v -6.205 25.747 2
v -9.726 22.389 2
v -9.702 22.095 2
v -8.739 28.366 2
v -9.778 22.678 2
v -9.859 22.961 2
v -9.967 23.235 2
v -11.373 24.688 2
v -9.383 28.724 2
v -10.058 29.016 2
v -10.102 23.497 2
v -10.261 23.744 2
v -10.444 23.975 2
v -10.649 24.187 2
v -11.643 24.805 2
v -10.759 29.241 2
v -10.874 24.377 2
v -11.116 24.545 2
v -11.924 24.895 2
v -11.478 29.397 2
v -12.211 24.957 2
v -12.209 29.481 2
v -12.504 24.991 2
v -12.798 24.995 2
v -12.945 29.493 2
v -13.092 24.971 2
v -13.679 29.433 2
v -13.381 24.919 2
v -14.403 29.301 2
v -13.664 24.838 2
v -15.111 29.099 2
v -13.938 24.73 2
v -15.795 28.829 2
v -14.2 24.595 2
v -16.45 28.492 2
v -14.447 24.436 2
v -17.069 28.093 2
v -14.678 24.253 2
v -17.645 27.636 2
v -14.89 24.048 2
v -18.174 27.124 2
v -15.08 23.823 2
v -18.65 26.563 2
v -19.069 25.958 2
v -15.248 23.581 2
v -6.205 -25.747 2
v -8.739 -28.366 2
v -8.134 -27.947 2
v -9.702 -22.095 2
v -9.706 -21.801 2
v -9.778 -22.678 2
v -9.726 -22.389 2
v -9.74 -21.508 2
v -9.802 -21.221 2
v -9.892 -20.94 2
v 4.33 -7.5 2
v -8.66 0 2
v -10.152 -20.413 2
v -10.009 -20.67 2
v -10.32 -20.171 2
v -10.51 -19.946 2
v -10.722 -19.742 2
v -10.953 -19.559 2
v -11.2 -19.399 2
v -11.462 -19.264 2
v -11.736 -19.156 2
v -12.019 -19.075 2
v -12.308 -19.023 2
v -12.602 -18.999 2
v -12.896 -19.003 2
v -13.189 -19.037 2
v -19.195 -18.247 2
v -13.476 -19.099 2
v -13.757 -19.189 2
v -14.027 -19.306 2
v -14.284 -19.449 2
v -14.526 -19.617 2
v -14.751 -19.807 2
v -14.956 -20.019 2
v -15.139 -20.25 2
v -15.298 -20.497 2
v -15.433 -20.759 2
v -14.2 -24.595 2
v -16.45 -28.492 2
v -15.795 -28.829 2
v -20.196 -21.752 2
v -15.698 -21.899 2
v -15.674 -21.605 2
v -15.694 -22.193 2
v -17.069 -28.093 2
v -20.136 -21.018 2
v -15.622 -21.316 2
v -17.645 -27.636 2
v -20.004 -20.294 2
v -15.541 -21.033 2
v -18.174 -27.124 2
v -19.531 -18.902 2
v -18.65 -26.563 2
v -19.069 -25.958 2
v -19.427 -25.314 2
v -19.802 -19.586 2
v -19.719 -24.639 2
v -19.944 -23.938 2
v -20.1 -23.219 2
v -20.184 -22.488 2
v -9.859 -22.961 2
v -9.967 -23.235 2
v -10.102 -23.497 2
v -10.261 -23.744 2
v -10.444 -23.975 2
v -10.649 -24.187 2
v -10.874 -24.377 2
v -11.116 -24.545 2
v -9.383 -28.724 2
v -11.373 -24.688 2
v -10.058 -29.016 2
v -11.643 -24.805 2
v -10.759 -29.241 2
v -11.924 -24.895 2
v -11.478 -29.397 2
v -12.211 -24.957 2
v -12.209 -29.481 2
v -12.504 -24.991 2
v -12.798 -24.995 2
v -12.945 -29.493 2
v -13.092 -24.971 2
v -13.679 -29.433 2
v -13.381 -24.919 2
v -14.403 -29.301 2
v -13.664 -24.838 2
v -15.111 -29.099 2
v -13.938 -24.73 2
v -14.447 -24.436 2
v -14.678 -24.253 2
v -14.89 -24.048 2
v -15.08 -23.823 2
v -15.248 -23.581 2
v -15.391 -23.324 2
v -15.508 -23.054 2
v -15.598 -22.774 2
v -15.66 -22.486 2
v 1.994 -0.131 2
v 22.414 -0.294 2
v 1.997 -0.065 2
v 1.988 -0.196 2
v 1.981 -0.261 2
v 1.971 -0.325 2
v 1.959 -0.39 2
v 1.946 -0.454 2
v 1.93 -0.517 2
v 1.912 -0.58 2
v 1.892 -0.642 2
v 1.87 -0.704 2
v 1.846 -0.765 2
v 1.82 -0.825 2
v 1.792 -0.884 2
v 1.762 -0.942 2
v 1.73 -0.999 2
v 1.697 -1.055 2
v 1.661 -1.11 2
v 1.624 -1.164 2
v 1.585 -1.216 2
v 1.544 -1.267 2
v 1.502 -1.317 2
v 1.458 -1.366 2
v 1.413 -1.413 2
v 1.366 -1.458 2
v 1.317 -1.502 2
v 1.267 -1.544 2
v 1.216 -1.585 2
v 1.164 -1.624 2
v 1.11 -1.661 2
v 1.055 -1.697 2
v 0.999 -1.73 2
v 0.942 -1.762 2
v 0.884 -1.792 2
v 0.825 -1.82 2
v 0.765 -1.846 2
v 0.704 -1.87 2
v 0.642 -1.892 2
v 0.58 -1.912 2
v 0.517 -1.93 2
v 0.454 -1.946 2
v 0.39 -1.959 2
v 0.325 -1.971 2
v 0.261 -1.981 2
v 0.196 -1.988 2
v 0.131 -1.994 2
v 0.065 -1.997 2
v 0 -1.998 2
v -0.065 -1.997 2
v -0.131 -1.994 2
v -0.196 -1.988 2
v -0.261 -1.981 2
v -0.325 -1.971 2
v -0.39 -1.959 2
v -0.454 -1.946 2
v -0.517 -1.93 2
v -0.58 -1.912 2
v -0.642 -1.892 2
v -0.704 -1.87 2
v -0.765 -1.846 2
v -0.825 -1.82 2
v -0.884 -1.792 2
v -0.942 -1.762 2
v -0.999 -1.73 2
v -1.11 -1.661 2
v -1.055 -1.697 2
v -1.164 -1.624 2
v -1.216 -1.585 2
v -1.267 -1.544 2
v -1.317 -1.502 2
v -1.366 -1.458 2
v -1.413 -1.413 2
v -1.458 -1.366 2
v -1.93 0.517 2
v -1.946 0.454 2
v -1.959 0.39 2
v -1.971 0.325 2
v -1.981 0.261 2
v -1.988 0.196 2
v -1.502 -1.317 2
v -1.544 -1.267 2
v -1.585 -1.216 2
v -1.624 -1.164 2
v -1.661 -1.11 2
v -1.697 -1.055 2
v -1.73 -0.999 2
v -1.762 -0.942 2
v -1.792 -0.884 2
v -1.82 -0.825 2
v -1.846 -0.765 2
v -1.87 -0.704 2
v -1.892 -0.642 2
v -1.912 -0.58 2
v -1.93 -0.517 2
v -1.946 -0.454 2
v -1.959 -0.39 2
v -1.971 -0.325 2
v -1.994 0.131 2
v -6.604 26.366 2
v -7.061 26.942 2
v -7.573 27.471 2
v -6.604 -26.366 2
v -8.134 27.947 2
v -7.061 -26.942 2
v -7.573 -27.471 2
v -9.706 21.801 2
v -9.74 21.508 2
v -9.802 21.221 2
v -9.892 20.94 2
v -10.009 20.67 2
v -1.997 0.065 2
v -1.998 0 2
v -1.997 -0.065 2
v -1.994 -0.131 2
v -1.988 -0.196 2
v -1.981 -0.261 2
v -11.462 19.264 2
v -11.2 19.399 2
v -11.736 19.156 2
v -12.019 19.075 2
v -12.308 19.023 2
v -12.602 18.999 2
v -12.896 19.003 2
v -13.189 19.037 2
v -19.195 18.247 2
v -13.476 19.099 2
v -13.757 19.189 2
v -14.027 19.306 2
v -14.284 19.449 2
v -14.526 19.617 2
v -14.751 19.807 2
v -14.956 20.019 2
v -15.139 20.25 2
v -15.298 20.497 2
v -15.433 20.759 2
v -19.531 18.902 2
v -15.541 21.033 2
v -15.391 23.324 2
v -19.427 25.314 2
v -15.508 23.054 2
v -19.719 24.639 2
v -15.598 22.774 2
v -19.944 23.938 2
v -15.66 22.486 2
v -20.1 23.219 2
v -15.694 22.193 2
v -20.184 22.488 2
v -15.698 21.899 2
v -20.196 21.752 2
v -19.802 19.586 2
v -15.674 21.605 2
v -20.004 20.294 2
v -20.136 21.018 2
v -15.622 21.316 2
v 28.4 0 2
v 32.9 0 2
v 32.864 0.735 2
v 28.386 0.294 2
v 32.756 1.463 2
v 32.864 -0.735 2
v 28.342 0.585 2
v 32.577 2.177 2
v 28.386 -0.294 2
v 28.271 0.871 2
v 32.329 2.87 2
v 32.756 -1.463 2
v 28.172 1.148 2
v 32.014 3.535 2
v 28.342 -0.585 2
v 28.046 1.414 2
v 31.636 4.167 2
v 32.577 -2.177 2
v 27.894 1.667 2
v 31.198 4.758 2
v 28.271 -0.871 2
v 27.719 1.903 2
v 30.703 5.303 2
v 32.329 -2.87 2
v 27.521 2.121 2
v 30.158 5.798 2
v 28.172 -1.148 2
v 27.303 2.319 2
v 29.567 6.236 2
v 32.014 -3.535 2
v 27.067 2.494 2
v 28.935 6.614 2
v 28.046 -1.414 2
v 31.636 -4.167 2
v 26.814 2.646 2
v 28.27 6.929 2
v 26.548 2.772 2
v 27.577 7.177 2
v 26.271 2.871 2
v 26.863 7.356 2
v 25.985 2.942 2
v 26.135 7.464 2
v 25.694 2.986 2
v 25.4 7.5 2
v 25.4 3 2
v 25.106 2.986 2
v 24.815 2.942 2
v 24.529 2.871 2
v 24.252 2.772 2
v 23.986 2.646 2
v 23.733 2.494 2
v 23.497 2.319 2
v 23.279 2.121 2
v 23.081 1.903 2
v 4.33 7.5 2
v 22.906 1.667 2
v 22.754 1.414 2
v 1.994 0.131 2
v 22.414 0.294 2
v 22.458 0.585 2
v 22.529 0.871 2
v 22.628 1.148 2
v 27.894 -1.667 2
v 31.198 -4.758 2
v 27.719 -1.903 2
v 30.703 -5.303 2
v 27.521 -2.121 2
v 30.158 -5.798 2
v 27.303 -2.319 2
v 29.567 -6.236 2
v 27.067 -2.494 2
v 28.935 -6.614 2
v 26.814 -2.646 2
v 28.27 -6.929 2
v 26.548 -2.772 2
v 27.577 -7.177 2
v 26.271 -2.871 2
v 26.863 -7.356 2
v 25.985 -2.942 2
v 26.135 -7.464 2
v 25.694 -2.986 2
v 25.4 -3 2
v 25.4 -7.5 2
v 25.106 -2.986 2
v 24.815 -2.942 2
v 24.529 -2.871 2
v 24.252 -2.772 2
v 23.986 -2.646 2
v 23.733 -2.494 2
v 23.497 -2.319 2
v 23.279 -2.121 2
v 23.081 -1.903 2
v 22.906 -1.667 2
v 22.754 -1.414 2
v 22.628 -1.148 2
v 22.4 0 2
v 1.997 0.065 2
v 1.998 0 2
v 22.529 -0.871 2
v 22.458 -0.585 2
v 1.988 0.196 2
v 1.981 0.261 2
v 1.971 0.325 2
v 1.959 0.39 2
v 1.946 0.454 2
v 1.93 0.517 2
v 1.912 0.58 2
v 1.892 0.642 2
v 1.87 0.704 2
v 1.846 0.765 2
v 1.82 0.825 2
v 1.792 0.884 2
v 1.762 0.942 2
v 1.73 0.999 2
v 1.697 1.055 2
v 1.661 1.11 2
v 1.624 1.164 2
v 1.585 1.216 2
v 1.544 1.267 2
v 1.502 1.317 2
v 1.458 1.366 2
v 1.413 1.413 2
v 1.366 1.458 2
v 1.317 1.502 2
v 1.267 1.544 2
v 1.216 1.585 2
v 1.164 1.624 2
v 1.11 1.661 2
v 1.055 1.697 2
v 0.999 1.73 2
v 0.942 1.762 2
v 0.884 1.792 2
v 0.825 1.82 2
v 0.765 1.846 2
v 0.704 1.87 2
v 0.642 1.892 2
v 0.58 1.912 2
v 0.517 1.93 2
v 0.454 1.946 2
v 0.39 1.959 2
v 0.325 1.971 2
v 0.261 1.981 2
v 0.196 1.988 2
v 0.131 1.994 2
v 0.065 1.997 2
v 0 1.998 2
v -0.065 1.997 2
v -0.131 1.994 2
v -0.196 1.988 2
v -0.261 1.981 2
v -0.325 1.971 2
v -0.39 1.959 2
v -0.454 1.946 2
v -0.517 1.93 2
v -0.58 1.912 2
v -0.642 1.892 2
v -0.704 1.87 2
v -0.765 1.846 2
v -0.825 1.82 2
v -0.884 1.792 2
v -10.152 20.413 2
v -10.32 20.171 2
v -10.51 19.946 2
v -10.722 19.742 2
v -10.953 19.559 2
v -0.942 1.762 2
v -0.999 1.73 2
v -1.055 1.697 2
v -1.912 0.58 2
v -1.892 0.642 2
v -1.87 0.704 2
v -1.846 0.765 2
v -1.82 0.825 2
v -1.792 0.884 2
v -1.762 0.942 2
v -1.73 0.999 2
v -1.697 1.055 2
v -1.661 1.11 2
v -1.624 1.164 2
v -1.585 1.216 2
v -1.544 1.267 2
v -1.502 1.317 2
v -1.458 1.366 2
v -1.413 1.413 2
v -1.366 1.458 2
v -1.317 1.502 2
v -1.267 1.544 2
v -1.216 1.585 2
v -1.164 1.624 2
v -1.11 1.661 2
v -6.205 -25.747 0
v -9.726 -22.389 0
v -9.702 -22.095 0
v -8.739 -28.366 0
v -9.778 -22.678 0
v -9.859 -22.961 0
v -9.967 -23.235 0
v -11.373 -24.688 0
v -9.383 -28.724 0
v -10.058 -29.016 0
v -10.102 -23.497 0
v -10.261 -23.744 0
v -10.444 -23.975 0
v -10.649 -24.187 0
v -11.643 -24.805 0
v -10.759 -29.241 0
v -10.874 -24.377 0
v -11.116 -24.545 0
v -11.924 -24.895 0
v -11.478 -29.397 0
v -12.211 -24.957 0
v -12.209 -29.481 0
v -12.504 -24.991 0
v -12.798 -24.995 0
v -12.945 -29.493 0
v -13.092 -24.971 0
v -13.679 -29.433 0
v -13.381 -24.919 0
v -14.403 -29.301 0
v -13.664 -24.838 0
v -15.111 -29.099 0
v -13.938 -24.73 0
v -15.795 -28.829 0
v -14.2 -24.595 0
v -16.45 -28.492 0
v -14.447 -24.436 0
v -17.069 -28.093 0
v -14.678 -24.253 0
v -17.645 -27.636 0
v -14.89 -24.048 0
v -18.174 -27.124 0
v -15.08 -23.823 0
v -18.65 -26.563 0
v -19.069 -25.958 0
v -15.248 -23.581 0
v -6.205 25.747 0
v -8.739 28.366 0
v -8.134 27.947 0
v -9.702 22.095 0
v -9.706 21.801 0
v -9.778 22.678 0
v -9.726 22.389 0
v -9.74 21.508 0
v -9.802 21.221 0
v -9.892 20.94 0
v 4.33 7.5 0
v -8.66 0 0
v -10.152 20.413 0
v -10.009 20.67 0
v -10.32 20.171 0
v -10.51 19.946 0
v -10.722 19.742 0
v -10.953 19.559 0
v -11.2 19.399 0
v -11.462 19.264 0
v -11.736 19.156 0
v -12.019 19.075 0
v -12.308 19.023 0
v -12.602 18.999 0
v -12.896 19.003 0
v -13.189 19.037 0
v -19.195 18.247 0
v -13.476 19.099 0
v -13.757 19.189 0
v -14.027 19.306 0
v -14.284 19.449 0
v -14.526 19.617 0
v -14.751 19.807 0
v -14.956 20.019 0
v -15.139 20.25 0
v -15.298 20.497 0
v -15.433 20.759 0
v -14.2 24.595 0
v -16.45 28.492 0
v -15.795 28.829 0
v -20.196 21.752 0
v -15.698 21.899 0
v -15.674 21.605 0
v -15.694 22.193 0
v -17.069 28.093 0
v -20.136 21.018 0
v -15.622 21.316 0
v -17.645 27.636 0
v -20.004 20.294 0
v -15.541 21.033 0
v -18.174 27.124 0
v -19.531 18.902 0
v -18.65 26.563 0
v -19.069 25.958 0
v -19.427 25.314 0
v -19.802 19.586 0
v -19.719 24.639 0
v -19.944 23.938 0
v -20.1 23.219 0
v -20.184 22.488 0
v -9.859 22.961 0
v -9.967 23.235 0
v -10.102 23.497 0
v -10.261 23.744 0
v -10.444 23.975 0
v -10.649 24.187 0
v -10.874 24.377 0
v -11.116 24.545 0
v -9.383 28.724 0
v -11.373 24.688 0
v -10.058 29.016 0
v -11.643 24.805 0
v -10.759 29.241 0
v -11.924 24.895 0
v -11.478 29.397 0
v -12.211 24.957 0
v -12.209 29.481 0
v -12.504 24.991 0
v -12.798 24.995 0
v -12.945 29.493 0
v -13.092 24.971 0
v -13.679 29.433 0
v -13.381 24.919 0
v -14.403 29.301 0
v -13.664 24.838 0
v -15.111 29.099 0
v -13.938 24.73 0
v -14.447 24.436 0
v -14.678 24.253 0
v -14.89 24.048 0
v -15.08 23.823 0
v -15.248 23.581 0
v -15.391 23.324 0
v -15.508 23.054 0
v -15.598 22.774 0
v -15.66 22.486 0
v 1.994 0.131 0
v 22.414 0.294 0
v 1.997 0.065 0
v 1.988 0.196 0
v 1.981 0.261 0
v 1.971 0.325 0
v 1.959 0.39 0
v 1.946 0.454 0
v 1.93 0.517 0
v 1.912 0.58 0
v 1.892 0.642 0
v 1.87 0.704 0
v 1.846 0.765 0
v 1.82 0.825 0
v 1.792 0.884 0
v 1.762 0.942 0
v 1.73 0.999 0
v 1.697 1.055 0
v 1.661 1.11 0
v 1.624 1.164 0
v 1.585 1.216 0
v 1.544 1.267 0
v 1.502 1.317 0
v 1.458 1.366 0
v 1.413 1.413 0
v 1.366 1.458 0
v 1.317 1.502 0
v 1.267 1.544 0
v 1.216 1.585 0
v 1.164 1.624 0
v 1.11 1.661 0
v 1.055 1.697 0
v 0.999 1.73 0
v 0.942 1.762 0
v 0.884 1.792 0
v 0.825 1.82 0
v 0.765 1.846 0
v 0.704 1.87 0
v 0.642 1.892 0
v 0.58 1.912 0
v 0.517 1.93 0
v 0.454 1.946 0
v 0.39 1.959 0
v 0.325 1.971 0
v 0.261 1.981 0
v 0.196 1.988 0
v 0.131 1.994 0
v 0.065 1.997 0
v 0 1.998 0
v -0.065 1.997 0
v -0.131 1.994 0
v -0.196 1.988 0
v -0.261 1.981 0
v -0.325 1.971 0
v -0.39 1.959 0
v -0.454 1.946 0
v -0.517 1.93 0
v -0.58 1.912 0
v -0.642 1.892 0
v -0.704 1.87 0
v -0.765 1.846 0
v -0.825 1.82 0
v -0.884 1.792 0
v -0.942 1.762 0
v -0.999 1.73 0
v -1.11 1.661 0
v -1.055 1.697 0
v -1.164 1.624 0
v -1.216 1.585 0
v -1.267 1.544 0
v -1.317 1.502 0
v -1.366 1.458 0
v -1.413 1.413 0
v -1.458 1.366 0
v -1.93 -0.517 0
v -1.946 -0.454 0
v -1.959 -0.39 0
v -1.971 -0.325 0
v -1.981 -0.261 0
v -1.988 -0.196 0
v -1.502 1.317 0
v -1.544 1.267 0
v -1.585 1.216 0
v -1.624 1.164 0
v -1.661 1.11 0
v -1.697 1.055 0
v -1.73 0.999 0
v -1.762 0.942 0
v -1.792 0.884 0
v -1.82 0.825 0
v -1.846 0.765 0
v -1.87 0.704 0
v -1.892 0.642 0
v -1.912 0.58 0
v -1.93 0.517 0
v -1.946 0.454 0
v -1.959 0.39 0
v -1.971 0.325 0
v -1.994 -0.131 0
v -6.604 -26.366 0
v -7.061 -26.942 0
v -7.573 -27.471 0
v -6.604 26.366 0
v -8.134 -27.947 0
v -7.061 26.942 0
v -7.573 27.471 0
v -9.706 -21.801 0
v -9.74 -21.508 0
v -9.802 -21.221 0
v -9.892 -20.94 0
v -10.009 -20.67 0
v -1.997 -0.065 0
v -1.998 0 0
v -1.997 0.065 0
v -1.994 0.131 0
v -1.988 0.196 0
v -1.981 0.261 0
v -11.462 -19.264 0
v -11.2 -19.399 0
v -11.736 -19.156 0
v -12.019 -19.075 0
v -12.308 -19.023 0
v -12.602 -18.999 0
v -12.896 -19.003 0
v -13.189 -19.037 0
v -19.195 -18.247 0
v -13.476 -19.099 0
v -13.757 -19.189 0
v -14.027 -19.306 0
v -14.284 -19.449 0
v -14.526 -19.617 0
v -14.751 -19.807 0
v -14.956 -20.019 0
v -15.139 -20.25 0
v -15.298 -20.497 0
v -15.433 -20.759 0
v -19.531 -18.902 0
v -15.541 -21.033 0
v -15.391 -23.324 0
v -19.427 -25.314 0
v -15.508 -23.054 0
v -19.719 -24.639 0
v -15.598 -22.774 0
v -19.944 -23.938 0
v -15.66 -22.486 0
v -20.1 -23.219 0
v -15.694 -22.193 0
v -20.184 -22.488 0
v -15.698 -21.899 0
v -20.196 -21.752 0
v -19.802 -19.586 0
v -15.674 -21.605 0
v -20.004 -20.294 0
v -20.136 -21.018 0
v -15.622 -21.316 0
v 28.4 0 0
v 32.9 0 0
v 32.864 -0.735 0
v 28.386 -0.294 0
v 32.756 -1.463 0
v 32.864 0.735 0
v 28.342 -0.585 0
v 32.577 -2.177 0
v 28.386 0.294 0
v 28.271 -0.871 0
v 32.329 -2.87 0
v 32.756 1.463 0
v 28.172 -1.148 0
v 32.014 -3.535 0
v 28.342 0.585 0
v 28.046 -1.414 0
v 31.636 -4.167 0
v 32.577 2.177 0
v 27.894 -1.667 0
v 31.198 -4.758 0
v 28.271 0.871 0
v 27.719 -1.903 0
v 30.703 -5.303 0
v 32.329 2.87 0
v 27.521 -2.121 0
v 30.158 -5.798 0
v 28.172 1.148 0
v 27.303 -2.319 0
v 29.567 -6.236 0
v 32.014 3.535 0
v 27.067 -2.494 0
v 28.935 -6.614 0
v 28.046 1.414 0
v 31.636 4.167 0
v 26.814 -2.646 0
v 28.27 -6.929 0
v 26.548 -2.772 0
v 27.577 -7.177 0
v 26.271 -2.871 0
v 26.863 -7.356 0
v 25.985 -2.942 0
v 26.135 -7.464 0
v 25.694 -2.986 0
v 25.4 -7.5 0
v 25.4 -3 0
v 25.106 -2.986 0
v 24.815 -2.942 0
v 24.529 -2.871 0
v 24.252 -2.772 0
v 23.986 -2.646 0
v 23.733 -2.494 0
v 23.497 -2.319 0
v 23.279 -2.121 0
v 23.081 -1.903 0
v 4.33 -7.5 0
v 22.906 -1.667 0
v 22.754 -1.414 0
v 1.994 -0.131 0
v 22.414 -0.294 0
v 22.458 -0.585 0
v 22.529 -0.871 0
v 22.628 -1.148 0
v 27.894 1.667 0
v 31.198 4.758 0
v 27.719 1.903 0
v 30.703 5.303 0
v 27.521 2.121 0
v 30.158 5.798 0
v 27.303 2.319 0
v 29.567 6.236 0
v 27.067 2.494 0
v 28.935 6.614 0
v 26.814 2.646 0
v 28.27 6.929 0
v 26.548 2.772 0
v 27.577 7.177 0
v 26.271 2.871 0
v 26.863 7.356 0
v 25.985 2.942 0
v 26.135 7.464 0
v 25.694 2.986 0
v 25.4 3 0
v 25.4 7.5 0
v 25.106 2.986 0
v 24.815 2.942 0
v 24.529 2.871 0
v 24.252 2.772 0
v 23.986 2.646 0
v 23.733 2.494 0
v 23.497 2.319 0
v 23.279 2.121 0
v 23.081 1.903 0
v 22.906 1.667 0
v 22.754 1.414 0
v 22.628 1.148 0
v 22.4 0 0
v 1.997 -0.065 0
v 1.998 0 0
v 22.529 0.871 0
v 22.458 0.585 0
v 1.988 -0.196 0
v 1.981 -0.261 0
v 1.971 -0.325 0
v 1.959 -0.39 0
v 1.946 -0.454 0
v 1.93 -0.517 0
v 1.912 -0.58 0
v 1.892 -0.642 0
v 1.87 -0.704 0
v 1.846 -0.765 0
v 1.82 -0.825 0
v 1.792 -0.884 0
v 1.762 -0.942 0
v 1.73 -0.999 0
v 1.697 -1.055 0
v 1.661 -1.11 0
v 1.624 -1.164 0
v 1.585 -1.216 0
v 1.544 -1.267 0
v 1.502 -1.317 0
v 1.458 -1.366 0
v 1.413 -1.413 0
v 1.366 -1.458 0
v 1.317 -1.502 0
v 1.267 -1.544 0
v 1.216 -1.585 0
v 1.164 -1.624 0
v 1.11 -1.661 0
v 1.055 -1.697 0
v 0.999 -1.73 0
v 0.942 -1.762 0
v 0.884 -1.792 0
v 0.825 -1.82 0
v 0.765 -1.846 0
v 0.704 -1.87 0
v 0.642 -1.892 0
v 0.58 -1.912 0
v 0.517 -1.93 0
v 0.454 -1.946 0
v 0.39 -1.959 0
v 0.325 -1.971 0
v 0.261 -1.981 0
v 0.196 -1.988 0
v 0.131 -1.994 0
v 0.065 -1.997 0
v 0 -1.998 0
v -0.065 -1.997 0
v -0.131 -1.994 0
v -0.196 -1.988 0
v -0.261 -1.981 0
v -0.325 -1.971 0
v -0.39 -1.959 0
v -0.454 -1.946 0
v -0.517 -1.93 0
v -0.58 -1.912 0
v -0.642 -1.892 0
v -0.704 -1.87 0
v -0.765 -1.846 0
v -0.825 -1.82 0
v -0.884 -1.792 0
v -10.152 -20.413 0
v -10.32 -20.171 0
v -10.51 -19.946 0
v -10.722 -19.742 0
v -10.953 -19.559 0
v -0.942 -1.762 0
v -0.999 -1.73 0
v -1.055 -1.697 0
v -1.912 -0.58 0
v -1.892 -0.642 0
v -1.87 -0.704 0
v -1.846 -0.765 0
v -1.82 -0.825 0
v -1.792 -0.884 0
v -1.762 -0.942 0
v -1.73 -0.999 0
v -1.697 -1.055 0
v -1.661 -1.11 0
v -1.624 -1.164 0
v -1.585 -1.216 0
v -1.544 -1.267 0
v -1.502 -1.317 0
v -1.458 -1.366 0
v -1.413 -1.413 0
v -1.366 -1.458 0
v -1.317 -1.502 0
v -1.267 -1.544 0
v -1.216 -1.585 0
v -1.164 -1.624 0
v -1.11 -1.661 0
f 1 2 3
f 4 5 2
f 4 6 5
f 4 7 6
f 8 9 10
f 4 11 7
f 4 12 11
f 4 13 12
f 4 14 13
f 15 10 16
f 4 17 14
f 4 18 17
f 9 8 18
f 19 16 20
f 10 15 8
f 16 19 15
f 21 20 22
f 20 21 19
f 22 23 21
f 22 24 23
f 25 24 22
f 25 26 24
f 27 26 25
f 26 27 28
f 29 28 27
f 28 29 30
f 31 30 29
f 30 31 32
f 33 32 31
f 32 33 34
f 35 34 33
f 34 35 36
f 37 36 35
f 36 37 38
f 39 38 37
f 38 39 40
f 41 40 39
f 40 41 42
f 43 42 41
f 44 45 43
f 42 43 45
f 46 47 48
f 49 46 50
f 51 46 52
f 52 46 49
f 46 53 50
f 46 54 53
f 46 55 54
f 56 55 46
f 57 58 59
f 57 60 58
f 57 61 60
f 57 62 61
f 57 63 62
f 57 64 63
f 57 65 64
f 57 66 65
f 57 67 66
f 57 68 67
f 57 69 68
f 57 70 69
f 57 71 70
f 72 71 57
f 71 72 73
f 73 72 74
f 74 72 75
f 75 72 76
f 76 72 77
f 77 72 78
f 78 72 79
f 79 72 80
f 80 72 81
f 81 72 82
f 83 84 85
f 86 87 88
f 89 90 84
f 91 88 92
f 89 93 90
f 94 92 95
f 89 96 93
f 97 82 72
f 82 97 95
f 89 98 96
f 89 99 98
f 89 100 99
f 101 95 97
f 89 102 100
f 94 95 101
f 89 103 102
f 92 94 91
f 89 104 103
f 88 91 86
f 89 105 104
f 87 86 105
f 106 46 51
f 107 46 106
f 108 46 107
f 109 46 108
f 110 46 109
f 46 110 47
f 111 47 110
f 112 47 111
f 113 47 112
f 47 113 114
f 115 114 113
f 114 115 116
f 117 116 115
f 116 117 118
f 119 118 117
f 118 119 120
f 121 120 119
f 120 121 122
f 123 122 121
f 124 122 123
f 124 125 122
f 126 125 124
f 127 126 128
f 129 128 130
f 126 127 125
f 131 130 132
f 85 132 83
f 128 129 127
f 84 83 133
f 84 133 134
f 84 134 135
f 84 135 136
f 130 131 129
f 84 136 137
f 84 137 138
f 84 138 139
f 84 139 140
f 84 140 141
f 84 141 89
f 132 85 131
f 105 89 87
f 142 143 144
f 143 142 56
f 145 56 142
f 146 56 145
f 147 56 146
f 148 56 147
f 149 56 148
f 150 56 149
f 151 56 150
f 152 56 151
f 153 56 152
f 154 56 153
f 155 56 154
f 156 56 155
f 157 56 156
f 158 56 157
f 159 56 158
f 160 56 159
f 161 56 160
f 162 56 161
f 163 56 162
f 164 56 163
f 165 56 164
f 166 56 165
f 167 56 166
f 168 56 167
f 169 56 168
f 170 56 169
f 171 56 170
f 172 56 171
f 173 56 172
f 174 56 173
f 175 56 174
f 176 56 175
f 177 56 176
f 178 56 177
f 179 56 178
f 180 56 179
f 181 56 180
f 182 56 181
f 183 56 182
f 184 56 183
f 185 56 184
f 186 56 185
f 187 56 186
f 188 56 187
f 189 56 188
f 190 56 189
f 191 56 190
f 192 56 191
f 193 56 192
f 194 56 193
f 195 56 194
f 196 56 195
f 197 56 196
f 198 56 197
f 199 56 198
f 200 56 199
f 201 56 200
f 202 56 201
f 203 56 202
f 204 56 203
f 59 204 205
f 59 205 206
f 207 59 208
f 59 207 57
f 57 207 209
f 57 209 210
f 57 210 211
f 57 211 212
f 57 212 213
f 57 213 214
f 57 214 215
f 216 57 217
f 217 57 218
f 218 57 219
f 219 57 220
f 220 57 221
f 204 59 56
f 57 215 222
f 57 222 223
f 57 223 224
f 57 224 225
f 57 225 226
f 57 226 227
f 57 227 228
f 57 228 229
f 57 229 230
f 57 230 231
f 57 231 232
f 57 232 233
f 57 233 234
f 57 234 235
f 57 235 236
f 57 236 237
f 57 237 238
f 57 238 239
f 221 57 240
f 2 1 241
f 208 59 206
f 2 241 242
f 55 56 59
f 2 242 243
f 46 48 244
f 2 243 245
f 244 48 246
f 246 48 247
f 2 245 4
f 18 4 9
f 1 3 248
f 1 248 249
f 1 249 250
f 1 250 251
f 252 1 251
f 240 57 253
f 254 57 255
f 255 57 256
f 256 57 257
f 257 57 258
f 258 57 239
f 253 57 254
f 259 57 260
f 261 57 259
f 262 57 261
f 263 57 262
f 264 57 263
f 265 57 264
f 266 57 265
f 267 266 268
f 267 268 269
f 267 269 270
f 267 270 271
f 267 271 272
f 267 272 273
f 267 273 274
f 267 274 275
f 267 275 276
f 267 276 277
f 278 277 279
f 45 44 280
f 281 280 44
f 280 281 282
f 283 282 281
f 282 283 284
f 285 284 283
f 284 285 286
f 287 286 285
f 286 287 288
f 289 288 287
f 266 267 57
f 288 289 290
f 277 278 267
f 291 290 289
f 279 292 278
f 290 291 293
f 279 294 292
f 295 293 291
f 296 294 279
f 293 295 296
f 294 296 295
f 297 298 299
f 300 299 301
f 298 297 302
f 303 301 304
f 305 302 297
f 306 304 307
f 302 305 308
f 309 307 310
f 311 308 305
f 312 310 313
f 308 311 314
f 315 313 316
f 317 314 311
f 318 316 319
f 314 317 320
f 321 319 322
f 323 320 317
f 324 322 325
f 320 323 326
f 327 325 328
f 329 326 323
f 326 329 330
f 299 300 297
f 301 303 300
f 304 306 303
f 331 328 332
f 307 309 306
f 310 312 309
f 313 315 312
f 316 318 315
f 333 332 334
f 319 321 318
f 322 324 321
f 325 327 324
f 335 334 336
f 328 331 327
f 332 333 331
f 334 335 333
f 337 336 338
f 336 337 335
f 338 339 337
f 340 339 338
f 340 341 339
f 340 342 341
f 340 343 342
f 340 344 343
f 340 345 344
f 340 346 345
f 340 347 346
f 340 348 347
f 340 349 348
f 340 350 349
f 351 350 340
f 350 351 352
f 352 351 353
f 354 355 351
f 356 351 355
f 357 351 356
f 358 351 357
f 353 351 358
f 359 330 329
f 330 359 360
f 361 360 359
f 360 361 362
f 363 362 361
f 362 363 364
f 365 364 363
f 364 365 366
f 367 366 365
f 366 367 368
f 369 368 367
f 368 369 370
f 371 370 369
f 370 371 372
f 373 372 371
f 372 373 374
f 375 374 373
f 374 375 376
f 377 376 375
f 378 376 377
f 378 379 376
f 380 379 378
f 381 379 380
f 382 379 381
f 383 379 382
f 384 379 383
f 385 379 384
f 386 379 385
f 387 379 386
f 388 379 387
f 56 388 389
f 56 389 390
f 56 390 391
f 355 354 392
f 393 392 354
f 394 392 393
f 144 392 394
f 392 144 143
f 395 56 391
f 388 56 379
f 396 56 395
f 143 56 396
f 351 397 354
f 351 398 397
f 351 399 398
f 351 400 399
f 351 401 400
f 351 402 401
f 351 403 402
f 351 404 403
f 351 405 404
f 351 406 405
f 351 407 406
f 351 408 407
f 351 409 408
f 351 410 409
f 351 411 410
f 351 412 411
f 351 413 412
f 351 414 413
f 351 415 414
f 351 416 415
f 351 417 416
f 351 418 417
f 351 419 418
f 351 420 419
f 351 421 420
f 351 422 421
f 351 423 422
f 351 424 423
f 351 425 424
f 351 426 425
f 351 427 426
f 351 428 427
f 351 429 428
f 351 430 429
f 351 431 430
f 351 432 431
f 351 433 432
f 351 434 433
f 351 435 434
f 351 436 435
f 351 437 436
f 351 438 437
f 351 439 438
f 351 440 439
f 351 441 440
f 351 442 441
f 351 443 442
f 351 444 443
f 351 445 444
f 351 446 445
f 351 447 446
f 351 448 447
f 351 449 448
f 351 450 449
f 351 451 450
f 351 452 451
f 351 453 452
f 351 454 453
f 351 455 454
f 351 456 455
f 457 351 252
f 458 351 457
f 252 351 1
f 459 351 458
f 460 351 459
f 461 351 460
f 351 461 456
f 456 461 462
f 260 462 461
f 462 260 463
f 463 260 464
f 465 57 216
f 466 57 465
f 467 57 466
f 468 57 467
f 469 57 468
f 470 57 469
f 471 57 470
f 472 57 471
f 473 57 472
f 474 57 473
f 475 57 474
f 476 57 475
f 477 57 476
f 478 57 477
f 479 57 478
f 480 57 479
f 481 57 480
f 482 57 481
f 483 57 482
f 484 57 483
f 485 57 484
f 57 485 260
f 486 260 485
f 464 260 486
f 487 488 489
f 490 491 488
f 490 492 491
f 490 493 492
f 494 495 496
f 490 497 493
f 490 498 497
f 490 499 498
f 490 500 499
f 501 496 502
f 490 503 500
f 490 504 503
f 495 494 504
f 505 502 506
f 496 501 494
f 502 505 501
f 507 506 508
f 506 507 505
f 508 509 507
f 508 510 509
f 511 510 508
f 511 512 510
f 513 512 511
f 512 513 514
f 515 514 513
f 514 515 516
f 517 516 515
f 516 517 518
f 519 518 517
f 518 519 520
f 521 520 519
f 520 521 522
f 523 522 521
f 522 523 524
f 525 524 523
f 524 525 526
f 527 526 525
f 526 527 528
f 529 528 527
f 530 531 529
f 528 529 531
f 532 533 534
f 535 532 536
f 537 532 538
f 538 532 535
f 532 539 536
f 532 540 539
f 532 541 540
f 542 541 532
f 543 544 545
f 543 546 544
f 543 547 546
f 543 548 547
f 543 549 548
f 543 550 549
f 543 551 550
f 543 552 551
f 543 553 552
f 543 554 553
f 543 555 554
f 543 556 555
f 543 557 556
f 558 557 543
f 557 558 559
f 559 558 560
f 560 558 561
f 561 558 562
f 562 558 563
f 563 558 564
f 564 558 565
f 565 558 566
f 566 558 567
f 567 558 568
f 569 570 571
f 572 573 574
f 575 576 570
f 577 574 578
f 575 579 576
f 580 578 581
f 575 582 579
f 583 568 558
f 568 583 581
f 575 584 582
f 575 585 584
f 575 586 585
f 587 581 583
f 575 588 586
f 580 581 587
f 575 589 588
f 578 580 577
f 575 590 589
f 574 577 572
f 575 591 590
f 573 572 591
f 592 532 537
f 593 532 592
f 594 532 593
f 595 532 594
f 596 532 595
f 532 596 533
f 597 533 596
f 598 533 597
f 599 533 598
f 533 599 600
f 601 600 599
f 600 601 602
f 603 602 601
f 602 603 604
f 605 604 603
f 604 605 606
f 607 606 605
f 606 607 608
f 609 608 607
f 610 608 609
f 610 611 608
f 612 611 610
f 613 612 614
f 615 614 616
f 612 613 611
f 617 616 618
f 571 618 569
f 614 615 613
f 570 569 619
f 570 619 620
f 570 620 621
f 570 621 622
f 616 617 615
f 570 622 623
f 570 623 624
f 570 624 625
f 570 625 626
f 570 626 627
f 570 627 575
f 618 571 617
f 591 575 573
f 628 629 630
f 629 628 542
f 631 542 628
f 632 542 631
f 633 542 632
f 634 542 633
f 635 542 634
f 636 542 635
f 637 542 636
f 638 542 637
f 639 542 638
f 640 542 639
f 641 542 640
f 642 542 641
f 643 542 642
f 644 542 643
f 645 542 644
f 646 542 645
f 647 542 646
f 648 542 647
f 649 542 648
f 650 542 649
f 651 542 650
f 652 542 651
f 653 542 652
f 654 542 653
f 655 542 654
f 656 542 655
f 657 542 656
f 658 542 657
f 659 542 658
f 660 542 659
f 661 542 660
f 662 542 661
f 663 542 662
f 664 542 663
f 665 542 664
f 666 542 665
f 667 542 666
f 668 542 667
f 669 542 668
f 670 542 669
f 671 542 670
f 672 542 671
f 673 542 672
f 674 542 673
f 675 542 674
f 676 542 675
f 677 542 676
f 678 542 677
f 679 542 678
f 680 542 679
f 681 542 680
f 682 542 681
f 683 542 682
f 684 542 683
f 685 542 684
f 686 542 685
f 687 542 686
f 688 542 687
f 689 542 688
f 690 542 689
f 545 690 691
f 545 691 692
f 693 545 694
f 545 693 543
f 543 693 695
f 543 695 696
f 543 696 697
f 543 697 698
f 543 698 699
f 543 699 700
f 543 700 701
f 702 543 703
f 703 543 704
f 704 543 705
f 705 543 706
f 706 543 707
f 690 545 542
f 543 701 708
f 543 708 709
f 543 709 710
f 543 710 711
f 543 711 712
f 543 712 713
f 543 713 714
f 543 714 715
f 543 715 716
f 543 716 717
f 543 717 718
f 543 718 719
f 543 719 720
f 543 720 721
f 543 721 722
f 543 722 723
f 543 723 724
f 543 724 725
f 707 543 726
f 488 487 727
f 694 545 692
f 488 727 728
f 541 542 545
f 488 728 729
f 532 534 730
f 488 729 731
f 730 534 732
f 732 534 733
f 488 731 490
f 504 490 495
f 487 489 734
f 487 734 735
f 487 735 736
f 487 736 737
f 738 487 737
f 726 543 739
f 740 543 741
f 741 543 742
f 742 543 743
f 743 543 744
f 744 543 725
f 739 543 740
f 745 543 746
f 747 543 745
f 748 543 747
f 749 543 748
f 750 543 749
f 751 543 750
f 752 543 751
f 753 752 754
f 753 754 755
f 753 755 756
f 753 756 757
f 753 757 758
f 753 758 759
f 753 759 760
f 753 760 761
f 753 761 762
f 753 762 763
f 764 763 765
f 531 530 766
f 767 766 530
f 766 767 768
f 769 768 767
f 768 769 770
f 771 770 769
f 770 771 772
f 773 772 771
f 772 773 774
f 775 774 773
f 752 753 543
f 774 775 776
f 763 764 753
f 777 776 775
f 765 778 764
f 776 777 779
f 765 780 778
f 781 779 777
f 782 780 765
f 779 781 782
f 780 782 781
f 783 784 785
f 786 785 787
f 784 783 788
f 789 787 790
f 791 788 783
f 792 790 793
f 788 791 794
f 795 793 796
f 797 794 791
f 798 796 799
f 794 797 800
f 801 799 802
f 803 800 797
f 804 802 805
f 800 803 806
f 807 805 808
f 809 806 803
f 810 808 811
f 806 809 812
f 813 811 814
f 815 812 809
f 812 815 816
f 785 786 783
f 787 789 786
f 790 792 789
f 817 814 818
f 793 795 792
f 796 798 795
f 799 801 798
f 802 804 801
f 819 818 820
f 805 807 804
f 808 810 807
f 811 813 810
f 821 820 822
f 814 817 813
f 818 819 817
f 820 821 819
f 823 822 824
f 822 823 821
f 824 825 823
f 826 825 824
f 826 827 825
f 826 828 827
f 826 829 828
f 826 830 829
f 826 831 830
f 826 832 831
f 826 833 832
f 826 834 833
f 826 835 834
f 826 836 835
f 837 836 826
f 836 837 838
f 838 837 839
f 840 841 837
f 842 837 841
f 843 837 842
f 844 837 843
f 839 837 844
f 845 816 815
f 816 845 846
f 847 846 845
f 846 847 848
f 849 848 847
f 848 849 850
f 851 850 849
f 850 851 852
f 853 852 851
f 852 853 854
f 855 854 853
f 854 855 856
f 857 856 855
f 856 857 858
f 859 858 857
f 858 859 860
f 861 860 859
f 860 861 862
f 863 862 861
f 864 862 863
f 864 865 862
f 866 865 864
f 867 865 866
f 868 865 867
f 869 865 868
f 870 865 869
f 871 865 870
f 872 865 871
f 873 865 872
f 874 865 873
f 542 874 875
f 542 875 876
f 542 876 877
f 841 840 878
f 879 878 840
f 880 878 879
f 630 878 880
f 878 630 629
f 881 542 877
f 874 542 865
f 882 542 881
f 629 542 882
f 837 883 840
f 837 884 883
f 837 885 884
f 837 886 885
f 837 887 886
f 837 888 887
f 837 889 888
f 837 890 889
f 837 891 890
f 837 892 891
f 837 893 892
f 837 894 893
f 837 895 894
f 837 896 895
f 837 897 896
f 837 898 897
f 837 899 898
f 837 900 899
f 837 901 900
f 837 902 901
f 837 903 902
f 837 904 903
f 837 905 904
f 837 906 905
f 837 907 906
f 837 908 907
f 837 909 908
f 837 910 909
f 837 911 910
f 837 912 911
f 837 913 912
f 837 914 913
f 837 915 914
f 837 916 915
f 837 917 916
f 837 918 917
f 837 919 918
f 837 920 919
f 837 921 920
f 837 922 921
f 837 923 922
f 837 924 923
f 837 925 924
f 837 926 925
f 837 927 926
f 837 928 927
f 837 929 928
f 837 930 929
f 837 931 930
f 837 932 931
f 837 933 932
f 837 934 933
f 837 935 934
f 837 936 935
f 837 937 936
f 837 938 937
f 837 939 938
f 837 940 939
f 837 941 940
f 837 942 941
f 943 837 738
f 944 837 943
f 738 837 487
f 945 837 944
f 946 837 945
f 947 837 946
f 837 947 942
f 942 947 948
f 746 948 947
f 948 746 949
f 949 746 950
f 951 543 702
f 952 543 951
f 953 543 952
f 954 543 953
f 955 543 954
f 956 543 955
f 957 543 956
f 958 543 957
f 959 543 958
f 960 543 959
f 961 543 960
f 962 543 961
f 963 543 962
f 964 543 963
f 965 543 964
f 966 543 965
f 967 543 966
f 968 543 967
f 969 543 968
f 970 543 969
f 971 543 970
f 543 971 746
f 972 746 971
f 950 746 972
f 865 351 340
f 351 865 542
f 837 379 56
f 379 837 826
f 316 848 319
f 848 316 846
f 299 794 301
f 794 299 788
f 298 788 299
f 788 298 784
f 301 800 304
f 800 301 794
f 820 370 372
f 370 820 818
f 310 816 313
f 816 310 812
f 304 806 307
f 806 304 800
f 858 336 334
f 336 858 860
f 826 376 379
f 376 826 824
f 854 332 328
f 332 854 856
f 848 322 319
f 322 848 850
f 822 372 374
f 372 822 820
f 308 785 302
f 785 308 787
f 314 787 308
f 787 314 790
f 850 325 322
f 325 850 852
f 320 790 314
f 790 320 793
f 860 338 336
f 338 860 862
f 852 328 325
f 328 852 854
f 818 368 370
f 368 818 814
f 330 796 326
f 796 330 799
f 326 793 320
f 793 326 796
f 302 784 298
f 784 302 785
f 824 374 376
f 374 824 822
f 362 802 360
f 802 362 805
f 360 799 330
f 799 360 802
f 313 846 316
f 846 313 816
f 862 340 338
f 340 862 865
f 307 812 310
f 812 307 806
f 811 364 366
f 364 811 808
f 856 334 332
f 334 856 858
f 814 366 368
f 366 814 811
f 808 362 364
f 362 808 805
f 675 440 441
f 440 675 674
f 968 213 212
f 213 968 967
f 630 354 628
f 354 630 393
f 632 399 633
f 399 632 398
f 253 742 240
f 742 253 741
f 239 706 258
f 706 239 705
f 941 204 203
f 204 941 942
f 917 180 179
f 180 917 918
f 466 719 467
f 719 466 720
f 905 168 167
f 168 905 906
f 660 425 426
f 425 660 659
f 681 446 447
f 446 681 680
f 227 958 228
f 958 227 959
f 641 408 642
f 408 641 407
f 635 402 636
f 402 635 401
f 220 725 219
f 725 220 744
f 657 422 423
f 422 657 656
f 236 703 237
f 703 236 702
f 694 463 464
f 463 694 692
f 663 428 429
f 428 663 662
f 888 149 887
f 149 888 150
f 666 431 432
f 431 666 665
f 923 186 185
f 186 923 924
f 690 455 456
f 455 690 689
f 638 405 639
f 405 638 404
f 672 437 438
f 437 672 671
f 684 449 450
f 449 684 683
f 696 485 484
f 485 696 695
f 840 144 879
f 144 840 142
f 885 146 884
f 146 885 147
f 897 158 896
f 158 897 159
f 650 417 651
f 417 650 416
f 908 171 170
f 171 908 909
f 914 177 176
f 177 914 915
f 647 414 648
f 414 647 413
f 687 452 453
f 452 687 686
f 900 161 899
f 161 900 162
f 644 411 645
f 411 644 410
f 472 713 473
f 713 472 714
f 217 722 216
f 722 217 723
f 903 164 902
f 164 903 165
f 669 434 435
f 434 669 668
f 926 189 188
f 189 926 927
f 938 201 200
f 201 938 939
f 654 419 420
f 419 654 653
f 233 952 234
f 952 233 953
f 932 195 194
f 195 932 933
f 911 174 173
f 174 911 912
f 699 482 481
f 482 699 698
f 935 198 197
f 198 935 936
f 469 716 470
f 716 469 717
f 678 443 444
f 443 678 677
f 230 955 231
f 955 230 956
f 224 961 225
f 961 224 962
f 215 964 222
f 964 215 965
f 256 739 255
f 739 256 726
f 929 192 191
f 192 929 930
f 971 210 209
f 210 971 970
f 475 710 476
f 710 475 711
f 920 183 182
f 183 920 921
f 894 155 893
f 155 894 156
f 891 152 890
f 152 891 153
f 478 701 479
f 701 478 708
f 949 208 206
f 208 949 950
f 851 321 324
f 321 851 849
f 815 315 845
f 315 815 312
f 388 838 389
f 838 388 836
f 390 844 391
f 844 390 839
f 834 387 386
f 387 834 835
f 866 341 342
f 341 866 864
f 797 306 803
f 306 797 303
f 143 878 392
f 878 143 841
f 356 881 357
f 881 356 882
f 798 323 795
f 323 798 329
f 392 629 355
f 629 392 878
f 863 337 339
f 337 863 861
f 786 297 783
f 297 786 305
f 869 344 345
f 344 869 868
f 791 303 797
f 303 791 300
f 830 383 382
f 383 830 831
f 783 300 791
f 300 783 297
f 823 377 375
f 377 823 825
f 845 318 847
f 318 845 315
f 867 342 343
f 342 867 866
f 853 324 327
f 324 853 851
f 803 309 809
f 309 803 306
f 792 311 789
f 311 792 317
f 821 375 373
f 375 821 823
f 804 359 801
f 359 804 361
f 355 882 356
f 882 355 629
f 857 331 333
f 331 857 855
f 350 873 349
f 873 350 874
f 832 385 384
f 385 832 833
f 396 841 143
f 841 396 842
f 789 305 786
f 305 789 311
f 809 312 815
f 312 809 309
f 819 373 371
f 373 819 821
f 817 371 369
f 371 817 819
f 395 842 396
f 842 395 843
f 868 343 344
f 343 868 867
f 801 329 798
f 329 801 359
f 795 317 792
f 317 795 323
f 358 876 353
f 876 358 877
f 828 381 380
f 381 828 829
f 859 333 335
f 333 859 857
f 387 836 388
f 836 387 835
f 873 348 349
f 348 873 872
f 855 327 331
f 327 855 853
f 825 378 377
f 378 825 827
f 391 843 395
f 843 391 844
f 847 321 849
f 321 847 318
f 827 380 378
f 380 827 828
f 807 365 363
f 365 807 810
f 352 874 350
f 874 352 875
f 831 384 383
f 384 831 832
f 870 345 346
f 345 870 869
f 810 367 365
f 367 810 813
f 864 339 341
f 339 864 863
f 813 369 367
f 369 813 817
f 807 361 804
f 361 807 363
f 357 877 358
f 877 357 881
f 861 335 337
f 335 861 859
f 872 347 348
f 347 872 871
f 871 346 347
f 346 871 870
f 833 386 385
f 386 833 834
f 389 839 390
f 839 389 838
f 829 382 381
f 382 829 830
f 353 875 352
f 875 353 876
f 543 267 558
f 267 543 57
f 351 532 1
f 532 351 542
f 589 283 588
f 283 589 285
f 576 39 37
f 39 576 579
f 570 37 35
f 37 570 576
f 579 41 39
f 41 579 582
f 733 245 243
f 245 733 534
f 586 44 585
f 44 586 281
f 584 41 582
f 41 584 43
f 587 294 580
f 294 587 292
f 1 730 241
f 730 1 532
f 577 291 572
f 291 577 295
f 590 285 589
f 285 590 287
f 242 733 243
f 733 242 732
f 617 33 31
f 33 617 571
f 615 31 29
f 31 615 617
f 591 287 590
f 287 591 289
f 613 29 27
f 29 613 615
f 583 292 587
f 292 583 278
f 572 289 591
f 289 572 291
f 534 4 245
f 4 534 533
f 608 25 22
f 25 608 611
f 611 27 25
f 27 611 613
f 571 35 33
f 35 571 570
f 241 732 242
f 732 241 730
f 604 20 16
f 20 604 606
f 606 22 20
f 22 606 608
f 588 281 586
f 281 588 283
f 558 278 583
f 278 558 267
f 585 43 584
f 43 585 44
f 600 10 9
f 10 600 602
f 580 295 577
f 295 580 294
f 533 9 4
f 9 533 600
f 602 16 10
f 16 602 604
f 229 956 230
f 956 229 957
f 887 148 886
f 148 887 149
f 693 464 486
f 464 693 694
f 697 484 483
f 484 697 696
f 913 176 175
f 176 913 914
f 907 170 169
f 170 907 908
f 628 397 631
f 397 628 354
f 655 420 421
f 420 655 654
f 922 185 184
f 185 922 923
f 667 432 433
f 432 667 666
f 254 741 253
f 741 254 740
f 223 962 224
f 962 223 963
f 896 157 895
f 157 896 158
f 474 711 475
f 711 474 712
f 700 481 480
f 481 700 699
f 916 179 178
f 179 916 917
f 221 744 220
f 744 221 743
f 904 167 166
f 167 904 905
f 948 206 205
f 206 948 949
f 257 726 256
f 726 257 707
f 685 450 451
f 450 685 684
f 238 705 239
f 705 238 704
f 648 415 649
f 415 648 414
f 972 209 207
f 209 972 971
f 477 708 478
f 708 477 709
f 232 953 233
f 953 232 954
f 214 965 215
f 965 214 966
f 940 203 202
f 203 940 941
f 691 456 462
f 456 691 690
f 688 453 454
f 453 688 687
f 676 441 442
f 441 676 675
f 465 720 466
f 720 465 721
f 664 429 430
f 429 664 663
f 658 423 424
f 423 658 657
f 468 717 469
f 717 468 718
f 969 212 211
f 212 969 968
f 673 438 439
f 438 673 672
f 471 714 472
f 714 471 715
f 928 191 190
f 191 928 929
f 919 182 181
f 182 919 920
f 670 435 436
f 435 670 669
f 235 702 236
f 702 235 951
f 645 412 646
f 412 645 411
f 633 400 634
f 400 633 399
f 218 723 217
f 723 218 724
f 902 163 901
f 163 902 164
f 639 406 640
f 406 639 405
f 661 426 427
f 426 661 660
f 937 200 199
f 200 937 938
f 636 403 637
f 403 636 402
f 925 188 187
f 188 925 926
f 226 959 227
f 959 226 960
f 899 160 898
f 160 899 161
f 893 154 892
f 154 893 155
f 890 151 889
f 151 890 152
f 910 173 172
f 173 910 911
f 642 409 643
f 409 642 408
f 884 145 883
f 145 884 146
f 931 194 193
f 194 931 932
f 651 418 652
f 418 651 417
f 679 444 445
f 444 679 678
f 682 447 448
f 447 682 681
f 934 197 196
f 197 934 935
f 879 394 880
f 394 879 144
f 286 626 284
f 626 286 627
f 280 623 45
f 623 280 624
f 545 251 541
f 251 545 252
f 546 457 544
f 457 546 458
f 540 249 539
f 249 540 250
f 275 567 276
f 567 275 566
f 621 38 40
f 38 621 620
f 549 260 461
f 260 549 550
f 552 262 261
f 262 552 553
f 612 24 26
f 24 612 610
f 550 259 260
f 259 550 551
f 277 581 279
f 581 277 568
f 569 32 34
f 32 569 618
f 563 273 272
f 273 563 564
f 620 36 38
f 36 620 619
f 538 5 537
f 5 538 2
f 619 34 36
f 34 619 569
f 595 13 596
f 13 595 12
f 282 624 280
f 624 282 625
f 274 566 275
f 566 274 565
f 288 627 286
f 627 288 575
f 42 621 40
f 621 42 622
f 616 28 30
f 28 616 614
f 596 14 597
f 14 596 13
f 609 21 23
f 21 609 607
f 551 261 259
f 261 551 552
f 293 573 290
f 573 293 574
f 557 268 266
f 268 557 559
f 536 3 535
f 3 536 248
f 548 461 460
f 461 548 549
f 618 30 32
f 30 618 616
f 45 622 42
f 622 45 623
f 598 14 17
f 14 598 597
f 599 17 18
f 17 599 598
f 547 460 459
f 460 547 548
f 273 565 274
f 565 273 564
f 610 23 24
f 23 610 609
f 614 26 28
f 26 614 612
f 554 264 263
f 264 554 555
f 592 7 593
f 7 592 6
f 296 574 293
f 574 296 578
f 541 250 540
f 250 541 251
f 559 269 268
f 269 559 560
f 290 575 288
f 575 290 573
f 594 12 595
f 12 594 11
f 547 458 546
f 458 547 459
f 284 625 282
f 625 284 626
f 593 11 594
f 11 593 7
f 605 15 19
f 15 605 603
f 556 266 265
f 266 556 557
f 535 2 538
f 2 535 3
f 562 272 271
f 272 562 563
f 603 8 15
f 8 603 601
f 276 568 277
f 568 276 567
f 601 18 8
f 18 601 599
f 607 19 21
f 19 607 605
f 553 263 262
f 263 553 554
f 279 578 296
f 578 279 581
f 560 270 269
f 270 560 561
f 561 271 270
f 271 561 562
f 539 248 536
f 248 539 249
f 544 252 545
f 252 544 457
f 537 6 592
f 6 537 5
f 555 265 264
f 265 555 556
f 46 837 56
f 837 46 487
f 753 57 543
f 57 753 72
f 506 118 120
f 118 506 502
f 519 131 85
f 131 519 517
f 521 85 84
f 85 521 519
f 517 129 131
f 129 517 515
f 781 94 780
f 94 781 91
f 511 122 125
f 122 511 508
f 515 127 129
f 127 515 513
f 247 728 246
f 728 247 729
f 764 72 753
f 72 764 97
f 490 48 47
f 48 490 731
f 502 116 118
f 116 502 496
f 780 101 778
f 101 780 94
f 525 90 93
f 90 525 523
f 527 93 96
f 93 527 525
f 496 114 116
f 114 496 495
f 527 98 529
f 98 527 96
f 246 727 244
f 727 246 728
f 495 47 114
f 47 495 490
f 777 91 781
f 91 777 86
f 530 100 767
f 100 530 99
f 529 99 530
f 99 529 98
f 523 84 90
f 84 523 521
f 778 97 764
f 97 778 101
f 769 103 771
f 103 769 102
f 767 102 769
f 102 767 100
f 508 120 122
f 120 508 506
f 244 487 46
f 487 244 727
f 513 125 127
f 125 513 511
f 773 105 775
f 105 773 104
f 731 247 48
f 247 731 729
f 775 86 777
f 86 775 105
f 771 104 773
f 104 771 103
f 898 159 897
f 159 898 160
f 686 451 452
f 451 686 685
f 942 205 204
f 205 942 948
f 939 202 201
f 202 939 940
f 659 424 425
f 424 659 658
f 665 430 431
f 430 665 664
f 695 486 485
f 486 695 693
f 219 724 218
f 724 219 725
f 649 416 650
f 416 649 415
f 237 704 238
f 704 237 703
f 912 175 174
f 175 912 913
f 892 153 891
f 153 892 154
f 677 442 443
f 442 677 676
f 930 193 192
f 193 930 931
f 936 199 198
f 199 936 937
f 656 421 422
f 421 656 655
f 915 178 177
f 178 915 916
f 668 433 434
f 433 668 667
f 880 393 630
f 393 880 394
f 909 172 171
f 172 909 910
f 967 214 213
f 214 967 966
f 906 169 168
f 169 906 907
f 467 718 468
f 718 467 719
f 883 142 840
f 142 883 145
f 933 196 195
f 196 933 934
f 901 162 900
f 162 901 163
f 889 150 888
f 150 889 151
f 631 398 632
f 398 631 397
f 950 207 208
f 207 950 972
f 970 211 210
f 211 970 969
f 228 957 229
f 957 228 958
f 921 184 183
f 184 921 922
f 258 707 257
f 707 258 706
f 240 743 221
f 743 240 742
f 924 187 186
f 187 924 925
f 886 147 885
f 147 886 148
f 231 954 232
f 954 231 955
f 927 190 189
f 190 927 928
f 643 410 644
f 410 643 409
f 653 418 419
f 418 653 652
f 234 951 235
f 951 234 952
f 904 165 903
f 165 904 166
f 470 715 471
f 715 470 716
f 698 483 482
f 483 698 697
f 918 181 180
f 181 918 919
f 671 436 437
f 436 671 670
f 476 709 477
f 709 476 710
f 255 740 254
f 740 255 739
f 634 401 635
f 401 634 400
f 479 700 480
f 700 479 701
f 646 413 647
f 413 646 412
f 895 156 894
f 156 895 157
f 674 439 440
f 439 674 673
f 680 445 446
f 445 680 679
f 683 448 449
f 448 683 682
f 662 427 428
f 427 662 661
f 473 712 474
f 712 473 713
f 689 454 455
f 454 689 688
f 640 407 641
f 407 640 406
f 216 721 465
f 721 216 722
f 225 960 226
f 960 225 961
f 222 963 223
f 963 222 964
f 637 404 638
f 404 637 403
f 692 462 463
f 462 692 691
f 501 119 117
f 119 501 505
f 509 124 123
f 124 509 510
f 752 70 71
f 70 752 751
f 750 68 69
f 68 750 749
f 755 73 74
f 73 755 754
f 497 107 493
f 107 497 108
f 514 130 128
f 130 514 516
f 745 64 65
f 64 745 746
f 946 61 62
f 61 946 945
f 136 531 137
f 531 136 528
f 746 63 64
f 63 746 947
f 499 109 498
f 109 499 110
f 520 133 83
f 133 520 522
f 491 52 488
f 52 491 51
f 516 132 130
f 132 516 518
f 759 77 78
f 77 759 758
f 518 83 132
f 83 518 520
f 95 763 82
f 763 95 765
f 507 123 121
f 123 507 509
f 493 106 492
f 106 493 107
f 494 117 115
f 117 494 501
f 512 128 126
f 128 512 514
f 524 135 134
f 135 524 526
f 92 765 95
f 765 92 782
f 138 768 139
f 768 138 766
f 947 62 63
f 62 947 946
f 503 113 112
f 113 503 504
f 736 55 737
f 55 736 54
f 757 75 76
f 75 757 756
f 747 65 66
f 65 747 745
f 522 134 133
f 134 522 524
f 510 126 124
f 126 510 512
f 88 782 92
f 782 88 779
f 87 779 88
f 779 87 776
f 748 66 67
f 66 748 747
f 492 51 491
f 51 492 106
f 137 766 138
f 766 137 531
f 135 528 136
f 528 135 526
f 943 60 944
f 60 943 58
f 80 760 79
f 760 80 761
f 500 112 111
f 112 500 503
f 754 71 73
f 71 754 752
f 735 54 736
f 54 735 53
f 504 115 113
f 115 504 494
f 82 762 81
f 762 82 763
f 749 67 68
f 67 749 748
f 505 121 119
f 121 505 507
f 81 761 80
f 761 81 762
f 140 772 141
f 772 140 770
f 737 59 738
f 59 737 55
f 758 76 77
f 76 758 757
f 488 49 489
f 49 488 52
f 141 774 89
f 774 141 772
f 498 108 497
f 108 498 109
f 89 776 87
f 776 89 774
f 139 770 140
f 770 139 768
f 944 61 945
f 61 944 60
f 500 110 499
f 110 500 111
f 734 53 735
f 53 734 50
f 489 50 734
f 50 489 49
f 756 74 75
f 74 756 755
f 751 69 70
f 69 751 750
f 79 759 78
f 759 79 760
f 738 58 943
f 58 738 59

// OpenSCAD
fn = 64;

module leg() {
  width = 15;
  length = 25.4;
  height= 2;
  radius = width / 2;
  m4_radius = 4 / 2;
  m6_radius = 6 / 2;
  difference() {
    union() {
      translate([0, -width/2, 0]) {
        cube(size = [length, width, height]);
      }
      cylinder(
        h = height,
        r1 = radius,
        r2 = radius, $fn=fn);
      translate([length, 0, 0]) {
        cylinder(
          h = height,
          r1 = radius,
          r2 = radius, $fn=fn);
      }
    }
    translate([0, 0, -height]) {
      cylinder(
        h = height*3,
        r1 = m4_radius ,
        r2 = m4_radius , $fn=fn);
    }
    translate([length, 0, -height]) {
      cylinder(
        h = height*3,
        r1 = m6_radius,
        r2 = m6_radius, $fn=fn);
    }
  }
}

module render() {
  leg();
  rotate(a=120, v=[0,0,1]) leg();
  rotate(a=240, v=[0,0,1]) leg();
}

echo(version=version());

render();
